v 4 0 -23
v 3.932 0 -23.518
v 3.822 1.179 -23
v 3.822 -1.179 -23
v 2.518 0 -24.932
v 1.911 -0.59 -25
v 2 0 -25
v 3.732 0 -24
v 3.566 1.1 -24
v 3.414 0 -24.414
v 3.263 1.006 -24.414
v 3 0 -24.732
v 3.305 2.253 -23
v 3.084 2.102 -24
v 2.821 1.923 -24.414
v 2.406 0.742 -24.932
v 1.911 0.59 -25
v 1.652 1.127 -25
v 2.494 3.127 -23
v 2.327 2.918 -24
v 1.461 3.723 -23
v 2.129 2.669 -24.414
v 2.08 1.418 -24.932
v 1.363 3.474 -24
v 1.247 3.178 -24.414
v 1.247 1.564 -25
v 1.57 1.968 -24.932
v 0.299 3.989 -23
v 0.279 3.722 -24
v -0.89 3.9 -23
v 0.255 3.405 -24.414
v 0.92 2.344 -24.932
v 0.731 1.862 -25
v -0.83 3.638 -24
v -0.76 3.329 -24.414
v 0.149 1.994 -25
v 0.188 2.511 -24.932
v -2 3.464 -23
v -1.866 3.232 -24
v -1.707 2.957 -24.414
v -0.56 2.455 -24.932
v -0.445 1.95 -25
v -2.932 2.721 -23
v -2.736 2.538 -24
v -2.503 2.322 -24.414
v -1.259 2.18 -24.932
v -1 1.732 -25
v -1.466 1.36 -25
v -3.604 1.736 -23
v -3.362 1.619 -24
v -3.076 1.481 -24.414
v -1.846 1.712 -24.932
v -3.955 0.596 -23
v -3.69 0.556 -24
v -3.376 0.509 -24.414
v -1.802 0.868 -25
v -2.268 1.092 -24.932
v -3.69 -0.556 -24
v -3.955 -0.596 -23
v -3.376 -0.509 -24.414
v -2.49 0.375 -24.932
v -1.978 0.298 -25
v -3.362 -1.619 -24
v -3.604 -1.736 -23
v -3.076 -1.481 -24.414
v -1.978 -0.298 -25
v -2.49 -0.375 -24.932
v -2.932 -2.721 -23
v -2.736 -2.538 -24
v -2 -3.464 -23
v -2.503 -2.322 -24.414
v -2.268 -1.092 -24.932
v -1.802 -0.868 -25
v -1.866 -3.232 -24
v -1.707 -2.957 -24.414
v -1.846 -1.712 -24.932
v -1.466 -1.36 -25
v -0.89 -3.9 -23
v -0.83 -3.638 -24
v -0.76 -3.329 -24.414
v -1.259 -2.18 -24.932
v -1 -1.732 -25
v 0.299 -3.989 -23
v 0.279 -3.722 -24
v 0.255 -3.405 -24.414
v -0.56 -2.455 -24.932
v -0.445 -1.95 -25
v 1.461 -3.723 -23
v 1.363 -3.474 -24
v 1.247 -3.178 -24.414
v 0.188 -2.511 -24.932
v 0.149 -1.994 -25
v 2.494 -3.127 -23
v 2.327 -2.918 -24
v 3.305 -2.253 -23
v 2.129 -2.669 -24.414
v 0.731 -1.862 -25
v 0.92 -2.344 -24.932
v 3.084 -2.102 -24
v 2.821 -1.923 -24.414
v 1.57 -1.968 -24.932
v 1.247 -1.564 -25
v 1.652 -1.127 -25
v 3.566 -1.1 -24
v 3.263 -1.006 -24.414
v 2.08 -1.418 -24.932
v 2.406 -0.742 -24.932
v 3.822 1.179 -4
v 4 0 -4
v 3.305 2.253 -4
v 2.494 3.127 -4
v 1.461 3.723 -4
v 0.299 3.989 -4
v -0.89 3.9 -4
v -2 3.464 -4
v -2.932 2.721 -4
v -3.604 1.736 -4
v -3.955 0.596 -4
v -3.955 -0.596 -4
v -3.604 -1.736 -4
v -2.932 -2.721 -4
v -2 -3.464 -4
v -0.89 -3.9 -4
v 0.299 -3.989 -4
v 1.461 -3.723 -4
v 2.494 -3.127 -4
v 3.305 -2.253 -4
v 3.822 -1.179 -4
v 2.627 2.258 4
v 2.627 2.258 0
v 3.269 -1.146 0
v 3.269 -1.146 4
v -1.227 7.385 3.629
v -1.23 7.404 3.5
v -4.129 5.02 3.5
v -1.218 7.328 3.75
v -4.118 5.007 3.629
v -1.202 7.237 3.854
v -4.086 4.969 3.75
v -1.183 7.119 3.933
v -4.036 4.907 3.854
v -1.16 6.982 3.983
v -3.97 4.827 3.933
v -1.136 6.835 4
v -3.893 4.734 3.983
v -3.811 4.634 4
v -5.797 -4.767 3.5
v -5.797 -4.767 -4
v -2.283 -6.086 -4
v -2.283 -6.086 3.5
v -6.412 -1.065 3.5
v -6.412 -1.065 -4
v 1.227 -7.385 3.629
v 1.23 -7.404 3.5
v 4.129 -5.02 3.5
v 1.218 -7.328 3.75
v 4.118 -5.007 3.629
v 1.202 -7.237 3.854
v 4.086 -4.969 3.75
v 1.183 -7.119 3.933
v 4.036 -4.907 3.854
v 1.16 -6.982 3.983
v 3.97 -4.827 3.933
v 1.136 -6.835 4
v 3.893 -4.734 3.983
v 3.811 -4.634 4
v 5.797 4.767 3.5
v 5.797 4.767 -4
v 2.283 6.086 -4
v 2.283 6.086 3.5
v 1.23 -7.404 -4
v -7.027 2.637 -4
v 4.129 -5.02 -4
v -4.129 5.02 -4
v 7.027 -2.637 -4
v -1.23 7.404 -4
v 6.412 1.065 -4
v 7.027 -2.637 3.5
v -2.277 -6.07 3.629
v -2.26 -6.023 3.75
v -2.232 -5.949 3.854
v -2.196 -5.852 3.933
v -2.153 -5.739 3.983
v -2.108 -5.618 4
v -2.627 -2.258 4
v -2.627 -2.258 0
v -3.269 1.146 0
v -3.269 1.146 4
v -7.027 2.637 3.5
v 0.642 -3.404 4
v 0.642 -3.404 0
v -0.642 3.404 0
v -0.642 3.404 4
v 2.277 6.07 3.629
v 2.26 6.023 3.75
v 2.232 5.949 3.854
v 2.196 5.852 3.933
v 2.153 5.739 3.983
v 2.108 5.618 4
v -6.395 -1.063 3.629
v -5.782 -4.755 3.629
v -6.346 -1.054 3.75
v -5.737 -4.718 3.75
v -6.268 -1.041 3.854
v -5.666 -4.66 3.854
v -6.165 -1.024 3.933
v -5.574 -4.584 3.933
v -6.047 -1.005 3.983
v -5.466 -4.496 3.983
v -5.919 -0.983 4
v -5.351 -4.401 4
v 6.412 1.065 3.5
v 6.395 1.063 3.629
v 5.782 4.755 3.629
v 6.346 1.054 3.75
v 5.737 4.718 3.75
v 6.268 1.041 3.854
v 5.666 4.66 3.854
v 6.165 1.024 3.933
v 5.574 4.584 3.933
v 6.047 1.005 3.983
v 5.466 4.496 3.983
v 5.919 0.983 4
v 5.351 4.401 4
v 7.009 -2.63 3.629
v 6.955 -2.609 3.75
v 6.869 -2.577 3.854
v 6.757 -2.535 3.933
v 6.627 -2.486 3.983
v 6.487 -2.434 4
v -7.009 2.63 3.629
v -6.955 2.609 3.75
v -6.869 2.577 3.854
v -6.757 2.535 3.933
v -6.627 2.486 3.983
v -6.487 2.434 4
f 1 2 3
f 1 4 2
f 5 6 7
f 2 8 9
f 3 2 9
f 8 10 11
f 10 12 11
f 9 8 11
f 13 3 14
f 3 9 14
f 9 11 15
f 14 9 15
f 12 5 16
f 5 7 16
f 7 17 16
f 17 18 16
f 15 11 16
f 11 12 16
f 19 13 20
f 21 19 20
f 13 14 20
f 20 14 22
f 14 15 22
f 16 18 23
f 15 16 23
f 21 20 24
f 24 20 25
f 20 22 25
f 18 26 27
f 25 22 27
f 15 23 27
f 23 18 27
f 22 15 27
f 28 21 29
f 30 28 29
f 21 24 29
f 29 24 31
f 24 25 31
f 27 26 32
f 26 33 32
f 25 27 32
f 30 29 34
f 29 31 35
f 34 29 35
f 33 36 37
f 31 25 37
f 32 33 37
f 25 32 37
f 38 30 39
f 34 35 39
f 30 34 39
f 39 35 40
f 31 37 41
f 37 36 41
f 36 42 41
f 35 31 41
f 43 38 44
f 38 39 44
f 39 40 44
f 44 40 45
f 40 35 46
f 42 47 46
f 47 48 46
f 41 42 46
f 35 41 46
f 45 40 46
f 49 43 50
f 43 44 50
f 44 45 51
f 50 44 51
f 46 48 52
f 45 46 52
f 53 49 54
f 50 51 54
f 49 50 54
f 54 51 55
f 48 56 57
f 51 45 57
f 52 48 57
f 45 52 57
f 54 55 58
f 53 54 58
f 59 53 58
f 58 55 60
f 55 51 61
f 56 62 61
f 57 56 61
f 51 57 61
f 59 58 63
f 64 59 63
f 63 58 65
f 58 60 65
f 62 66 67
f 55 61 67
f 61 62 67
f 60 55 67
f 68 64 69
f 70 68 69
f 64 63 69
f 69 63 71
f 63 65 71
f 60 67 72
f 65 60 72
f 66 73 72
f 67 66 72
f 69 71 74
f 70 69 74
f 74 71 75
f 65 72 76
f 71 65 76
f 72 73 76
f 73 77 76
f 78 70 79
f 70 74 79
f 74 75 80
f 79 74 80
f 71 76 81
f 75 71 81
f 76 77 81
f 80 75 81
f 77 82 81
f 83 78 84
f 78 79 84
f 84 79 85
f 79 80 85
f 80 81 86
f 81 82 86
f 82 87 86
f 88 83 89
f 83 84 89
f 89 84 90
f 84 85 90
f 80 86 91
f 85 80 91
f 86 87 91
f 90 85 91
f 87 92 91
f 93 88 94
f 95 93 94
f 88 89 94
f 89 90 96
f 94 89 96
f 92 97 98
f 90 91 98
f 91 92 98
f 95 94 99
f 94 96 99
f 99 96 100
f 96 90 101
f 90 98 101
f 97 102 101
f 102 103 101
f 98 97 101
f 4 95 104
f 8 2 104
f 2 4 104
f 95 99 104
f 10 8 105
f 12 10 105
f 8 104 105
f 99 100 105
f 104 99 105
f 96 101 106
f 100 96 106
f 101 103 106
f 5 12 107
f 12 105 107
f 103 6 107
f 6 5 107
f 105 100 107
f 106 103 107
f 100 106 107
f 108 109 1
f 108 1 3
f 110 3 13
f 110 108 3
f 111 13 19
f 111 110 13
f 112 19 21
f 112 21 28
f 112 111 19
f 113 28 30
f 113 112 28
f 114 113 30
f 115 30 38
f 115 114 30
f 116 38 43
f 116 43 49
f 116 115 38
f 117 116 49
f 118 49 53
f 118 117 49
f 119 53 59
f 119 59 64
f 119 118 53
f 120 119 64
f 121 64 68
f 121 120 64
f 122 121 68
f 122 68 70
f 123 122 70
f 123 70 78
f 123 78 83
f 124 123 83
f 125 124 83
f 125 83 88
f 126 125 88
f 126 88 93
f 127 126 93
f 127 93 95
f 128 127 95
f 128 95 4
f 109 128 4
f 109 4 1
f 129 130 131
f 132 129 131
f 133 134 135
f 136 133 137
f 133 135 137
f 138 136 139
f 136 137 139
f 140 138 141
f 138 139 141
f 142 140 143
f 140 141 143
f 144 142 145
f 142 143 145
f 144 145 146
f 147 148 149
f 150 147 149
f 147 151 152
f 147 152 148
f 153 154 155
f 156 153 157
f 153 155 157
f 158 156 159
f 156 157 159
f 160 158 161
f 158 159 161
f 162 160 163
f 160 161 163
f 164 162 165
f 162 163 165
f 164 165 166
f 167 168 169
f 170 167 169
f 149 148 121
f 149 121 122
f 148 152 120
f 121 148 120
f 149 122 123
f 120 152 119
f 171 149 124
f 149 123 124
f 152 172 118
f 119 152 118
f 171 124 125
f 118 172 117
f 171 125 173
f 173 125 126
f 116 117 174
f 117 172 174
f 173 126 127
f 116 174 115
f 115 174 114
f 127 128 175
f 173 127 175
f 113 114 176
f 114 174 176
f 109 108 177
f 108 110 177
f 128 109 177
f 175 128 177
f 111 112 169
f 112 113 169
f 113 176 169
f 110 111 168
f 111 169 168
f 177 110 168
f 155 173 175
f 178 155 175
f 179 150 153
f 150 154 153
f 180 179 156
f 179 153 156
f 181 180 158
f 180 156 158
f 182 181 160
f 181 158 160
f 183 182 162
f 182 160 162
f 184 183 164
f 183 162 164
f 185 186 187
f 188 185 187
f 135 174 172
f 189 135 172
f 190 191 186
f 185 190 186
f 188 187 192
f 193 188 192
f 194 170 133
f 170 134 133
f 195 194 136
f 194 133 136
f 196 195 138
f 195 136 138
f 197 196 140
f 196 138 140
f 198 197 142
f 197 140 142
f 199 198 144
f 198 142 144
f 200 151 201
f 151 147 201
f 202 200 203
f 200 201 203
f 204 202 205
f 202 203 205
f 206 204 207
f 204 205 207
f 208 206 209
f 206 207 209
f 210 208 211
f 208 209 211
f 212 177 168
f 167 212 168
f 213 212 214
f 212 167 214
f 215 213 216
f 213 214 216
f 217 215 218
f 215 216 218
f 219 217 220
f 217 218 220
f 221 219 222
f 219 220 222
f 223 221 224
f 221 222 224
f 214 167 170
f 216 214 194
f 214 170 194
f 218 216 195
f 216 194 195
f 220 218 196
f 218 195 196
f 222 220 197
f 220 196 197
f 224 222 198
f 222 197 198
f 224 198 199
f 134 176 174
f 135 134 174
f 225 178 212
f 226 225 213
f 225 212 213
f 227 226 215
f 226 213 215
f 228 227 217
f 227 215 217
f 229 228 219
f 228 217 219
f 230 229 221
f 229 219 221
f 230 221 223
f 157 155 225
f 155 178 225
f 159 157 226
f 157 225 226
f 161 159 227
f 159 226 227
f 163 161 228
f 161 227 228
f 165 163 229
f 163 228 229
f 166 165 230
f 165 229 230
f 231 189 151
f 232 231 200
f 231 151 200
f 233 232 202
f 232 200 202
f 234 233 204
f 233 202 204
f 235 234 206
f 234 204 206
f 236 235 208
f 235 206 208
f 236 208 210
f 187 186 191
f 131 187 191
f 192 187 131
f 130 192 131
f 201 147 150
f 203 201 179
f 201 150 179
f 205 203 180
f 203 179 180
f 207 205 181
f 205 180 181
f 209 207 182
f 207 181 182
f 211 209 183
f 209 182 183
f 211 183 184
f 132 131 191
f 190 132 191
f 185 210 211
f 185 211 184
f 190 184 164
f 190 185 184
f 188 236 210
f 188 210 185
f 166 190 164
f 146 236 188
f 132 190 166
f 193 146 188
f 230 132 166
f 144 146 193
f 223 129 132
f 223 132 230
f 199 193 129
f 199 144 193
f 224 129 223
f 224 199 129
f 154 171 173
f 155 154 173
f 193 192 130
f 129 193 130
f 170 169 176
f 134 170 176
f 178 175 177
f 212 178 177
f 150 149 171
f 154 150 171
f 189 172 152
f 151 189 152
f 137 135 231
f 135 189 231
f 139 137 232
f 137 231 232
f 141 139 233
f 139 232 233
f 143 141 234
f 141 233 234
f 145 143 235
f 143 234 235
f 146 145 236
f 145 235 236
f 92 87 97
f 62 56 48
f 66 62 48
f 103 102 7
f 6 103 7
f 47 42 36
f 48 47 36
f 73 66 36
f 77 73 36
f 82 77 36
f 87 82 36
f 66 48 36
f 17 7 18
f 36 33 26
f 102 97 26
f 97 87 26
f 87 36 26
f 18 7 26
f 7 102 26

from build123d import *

# Parameters (mm, degrees)
F0_R     = 4
F1_DEPTH = 4
F2_DEPTH = 4
F3_DEPTH = 25
F4_R     = 2
F5_R     = 0.5


with BuildPart() as f1:
    # F0 (on Top) → F1 (new body)
    with BuildSketch(Plane.XY):
        with BuildLine():
            ThreePointArc((4.1287042683, -5.02033874), (5.8773539005, -2.776096383), (6.5, 0))
            ThreePointArc((6.5, 0), (6.4779859765, 0.534506958), (6.412093019, 1.0653934086))
            ThreePointArc((6.412093019, 1.0653934086), (5.020338785, 4.1287042137), (2.2833888805, 6.0857321023))
            ThreePointArc((2.2833888805, 6.0857321023), (-1.0653932869, 6.4120930393), (-4.1287041813, 5.0203388116))
            ThreePointArc((-4.1287041813, 5.0203388116), (-6.0857321431, 2.2833887717), (-6.4120930076, -1.0653934773))
            ThreePointArc((-6.4120930076, -1.0653934773), (-5.020338751, -4.1287042549), (-2.2833888456, -6.0857321153))
            ThreePointArc((-2.2833888456, -6.0857321153), (1.0653933609, -6.412093027), (4.1287042683, -5.02033874))
        make_face()
        Circle(F0_R, mode=Mode.SUBTRACT)
        with BuildLine():
            ThreePointArc((6.412093019, 1.0653934086), (6.4779859765, 0.534506958), (6.5, 0))
            ThreePointArc((6.5, 0), (5.8773539005, -2.776096383), (4.1287042683, -5.02033874))
            Line((4.1287042683, -5.02033874), (7.027198158, -2.6366303082))
            Line((7.027198158, -2.6366303082), (6.412093019, 1.0653934086))
        make_face()
        with BuildLine():
            ThreePointArc((2.2833888805, 6.0857321023), (5.020338785, 4.1287042137), (6.412093019, 1.0653934086))
            Line((6.412093019, 1.0653934086), (5.7969879062, 4.7674169681))
            Line((5.7969879062, 4.7674169681), (2.2833888805, 6.0857321023))
        make_face()
        with BuildLine():
            Line((1.2302102517, -7.4040472763), (4.1287042683, -5.02033874))
            ThreePointArc((4.1287042683, -5.02033874), (1.0653933609, -6.412093027), (-2.2833888456, -6.0857321153))
            Line((-2.2833888456, -6.0857321153), (1.2302102517, -7.4040472763))
        make_face()
        with BuildLine():
            ThreePointArc((-4.1287041813, 5.0203388116), (-1.0653932869, 6.4120930393), (2.2833888805, 6.0857321023))
            Line((2.2833888805, 6.0857321023), (-1.2302102517, 7.4040472763))
            Line((-1.2302102517, 7.4040472763), (-4.1287041813, 5.0203388116))
        make_face()
        with BuildLine():
            Line((-5.7969879062, -4.7674169681), (-2.2833888456, -6.0857321153))
            ThreePointArc((-2.2833888456, -6.0857321153), (-5.020338751, -4.1287042549), (-6.4120930076, -1.0653934773))
            Line((-6.4120930076, -1.0653934773), (-5.7969879062, -4.7674169681))
        make_face()
        with BuildLine():
            ThreePointArc((-6.4120930076, -1.0653934773), (-6.0857321431, 2.2833887717), (-4.1287041813, 5.0203388116))
            Line((-4.1287041813, 5.0203388116), (-7.027198158, 2.6366303082))
            Line((-7.027198158, 2.6366303082), (-6.4120930076, -1.0653934773))
        make_face()
        Circle(F0_R)
        Polygon((-2.6272431226, -2.2577851038), (-3.2689208174, 1.1463667342), (-0.6416776948, 3.404151838), (2.6272431226, 2.2577851038), (3.2689208174, -1.1463667342), (0.6416776948, -3.404151838), align=None, mode=Mode.SUBTRACT)
        Polygon((-0.6416776948, 3.404151838), (-3.2689208174, 1.1463667342), (-2.6272431226, -2.2577851038), (0.6416776948, -3.404151838), (3.2689208174, -1.1463667342), (2.6272431226, 2.2577851038), align=None)
    extrude(amount=-F1_DEPTH)

    # F0 (on Top) → F2 (join)
    with BuildSketch(Plane.XY):
        with BuildLine():
            ThreePointArc((4.1287042683, -5.02033874), (5.8773539005, -2.776096383), (6.5, 0))
            ThreePointArc((6.5, 0), (6.4779859765, 0.534506958), (6.412093019, 1.0653934086))
            ThreePointArc((6.412093019, 1.0653934086), (5.020338785, 4.1287042137), (2.2833888805, 6.0857321023))
            ThreePointArc((2.2833888805, 6.0857321023), (-1.0653932869, 6.4120930393), (-4.1287041813, 5.0203388116))
            ThreePointArc((-4.1287041813, 5.0203388116), (-6.0857321431, 2.2833887717), (-6.4120930076, -1.0653934773))
            ThreePointArc((-6.4120930076, -1.0653934773), (-5.020338751, -4.1287042549), (-2.2833888456, -6.0857321153))
            ThreePointArc((-2.2833888456, -6.0857321153), (1.0653933609, -6.412093027), (4.1287042683, -5.02033874))
        make_face()
        Circle(F0_R, mode=Mode.SUBTRACT)
        Circle(F0_R)
        Polygon((-2.6272431226, -2.2577851038), (-3.2689208174, 1.1463667342), (-0.6416776948, 3.404151838), (2.6272431226, 2.2577851038), (3.2689208174, -1.1463667342), (0.6416776948, -3.404151838), align=None, mode=Mode.SUBTRACT)
        with BuildLine():
            ThreePointArc((-4.1287041813, 5.0203388116), (-1.0653932869, 6.4120930393), (2.2833888805, 6.0857321023))
            Line((2.2833888805, 6.0857321023), (-1.2302102517, 7.4040472763))
            Line((-1.2302102517, 7.4040472763), (-4.1287041813, 5.0203388116))
        make_face()
        with BuildLine():
            ThreePointArc((-6.4120930076, -1.0653934773), (-6.0857321431, 2.2833887717), (-4.1287041813, 5.0203388116))
            Line((-4.1287041813, 5.0203388116), (-7.027198158, 2.6366303082))
            Line((-7.027198158, 2.6366303082), (-6.4120930076, -1.0653934773))
        make_face()
        with BuildLine():
            Line((-5.7969879062, -4.7674169681), (-2.2833888456, -6.0857321153))
            ThreePointArc((-2.2833888456, -6.0857321153), (-5.020338751, -4.1287042549), (-6.4120930076, -1.0653934773))
            Line((-6.4120930076, -1.0653934773), (-5.7969879062, -4.7674169681))
        make_face()
        with BuildLine():
            ThreePointArc((2.2833888805, 6.0857321023), (5.020338785, 4.1287042137), (6.412093019, 1.0653934086))
            Line((6.412093019, 1.0653934086), (5.7969879062, 4.7674169681))
            Line((5.7969879062, 4.7674169681), (2.2833888805, 6.0857321023))
        make_face()
        with BuildLine():
            ThreePointArc((6.412093019, 1.0653934086), (6.4779859765, 0.534506958), (6.5, 0))
            ThreePointArc((6.5, 0), (5.8773539005, -2.776096383), (4.1287042683, -5.02033874))
            Line((4.1287042683, -5.02033874), (7.027198158, -2.6366303082))
            Line((7.027198158, -2.6366303082), (6.412093019, 1.0653934086))
        make_face()
        with BuildLine():
            Line((1.2302102517, -7.4040472763), (4.1287042683, -5.02033874))
            ThreePointArc((4.1287042683, -5.02033874), (1.0653933609, -6.412093027), (-2.2833888456, -6.0857321153))
            Line((-2.2833888456, -6.0857321153), (1.2302102517, -7.4040472763))
        make_face()
    extrude(amount=F2_DEPTH)

    # F0 (on Top) → F3 (join)
    with BuildSketch(Plane.XY):
        Circle(F0_R)
        Polygon((-2.6272431226, -2.2577851038), (-3.2689208174, 1.1463667342), (-0.6416776948, 3.404151838), (2.6272431226, 2.2577851038), (3.2689208174, -1.1463667342), (0.6416776948, -3.404151838), align=None, mode=Mode.SUBTRACT)
        Polygon((-0.6416776948, 3.404151838), (-3.2689208174, 1.1463667342), (-2.6272431226, -2.2577851038), (0.6416776948, -3.404151838), (3.2689208174, -1.1463667342), (2.6272431226, 2.2577851038), align=None)
    extrude(amount=-F3_DEPTH)

    # F4
    f4_edges = [f1.edges().sort_by_distance(p)[0] for p in [
        (-4, 0, -25),
    ]]
    fillet(f4_edges, radius=F4_R)

    # F5
    f5_edges = [f1.edges().sort_by_distance(p)[0] for p in [
        (-6.412093, -1.065393, 4),
        (-2.283389, -6.085732, 4),
        (4.128704, -5.020339, 4),
        (6.412093, 1.065393, 4),
        (2.283389, 6.085732, 4),
        (-4.128704, 5.020339, 4),
    ]]
    fillet(f5_edges, radius=F5_R)


solid = f1.part
